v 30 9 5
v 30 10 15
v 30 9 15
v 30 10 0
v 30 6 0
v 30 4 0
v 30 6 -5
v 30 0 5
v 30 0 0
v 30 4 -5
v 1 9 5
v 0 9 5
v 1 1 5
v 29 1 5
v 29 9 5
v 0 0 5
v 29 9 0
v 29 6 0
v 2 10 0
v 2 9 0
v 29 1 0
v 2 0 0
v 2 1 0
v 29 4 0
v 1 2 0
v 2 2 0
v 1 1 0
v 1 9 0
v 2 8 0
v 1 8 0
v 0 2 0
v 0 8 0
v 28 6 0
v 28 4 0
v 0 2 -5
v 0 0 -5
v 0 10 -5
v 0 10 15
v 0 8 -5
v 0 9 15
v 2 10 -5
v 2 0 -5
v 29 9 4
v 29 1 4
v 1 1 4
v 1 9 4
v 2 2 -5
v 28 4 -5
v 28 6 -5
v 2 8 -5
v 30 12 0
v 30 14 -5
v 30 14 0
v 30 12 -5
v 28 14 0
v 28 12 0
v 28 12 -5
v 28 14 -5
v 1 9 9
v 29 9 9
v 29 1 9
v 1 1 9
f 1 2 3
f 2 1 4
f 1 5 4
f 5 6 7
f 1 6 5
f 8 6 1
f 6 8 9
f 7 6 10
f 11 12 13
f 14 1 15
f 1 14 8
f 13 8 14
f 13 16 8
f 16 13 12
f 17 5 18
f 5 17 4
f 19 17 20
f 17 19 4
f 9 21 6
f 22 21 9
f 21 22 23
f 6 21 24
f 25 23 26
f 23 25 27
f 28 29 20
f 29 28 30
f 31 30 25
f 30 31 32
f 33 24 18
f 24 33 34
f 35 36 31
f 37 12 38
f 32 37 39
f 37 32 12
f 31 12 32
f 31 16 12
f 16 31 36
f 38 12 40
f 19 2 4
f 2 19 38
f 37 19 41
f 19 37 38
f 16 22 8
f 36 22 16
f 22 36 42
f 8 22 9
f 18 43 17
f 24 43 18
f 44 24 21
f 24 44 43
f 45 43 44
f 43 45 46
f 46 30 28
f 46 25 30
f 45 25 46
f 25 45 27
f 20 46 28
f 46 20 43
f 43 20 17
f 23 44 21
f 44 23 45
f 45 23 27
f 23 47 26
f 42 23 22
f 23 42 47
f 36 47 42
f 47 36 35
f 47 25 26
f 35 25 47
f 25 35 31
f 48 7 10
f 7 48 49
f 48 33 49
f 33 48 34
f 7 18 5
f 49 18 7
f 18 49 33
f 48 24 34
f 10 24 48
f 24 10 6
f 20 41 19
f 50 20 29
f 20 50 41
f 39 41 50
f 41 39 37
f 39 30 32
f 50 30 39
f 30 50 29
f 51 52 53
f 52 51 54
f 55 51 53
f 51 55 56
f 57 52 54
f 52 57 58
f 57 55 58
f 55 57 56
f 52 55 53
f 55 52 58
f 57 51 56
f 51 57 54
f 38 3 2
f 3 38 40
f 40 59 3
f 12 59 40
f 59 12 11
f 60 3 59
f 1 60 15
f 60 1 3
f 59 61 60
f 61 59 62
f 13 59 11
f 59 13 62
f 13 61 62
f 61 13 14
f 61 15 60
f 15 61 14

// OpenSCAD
// Couch frame
difference() {
    cube([30, 10, 5]);
    translate([1, 1, 0]) cube([28, 8, 4]);
}

// Couch legs
for (i = [0:3])
    translate([i % 2 * 28, i / 2 * 8, -5]) cube([2, 2, 5]);

// Couch backrest
translate([0, 9, 5]) cube([30, 1, 10]);

// Couch cushions
translate([1, 1, 5]) cube([14, 8, 4]);
translate([15, 1, 5]) cube([14, 8, 4]);
